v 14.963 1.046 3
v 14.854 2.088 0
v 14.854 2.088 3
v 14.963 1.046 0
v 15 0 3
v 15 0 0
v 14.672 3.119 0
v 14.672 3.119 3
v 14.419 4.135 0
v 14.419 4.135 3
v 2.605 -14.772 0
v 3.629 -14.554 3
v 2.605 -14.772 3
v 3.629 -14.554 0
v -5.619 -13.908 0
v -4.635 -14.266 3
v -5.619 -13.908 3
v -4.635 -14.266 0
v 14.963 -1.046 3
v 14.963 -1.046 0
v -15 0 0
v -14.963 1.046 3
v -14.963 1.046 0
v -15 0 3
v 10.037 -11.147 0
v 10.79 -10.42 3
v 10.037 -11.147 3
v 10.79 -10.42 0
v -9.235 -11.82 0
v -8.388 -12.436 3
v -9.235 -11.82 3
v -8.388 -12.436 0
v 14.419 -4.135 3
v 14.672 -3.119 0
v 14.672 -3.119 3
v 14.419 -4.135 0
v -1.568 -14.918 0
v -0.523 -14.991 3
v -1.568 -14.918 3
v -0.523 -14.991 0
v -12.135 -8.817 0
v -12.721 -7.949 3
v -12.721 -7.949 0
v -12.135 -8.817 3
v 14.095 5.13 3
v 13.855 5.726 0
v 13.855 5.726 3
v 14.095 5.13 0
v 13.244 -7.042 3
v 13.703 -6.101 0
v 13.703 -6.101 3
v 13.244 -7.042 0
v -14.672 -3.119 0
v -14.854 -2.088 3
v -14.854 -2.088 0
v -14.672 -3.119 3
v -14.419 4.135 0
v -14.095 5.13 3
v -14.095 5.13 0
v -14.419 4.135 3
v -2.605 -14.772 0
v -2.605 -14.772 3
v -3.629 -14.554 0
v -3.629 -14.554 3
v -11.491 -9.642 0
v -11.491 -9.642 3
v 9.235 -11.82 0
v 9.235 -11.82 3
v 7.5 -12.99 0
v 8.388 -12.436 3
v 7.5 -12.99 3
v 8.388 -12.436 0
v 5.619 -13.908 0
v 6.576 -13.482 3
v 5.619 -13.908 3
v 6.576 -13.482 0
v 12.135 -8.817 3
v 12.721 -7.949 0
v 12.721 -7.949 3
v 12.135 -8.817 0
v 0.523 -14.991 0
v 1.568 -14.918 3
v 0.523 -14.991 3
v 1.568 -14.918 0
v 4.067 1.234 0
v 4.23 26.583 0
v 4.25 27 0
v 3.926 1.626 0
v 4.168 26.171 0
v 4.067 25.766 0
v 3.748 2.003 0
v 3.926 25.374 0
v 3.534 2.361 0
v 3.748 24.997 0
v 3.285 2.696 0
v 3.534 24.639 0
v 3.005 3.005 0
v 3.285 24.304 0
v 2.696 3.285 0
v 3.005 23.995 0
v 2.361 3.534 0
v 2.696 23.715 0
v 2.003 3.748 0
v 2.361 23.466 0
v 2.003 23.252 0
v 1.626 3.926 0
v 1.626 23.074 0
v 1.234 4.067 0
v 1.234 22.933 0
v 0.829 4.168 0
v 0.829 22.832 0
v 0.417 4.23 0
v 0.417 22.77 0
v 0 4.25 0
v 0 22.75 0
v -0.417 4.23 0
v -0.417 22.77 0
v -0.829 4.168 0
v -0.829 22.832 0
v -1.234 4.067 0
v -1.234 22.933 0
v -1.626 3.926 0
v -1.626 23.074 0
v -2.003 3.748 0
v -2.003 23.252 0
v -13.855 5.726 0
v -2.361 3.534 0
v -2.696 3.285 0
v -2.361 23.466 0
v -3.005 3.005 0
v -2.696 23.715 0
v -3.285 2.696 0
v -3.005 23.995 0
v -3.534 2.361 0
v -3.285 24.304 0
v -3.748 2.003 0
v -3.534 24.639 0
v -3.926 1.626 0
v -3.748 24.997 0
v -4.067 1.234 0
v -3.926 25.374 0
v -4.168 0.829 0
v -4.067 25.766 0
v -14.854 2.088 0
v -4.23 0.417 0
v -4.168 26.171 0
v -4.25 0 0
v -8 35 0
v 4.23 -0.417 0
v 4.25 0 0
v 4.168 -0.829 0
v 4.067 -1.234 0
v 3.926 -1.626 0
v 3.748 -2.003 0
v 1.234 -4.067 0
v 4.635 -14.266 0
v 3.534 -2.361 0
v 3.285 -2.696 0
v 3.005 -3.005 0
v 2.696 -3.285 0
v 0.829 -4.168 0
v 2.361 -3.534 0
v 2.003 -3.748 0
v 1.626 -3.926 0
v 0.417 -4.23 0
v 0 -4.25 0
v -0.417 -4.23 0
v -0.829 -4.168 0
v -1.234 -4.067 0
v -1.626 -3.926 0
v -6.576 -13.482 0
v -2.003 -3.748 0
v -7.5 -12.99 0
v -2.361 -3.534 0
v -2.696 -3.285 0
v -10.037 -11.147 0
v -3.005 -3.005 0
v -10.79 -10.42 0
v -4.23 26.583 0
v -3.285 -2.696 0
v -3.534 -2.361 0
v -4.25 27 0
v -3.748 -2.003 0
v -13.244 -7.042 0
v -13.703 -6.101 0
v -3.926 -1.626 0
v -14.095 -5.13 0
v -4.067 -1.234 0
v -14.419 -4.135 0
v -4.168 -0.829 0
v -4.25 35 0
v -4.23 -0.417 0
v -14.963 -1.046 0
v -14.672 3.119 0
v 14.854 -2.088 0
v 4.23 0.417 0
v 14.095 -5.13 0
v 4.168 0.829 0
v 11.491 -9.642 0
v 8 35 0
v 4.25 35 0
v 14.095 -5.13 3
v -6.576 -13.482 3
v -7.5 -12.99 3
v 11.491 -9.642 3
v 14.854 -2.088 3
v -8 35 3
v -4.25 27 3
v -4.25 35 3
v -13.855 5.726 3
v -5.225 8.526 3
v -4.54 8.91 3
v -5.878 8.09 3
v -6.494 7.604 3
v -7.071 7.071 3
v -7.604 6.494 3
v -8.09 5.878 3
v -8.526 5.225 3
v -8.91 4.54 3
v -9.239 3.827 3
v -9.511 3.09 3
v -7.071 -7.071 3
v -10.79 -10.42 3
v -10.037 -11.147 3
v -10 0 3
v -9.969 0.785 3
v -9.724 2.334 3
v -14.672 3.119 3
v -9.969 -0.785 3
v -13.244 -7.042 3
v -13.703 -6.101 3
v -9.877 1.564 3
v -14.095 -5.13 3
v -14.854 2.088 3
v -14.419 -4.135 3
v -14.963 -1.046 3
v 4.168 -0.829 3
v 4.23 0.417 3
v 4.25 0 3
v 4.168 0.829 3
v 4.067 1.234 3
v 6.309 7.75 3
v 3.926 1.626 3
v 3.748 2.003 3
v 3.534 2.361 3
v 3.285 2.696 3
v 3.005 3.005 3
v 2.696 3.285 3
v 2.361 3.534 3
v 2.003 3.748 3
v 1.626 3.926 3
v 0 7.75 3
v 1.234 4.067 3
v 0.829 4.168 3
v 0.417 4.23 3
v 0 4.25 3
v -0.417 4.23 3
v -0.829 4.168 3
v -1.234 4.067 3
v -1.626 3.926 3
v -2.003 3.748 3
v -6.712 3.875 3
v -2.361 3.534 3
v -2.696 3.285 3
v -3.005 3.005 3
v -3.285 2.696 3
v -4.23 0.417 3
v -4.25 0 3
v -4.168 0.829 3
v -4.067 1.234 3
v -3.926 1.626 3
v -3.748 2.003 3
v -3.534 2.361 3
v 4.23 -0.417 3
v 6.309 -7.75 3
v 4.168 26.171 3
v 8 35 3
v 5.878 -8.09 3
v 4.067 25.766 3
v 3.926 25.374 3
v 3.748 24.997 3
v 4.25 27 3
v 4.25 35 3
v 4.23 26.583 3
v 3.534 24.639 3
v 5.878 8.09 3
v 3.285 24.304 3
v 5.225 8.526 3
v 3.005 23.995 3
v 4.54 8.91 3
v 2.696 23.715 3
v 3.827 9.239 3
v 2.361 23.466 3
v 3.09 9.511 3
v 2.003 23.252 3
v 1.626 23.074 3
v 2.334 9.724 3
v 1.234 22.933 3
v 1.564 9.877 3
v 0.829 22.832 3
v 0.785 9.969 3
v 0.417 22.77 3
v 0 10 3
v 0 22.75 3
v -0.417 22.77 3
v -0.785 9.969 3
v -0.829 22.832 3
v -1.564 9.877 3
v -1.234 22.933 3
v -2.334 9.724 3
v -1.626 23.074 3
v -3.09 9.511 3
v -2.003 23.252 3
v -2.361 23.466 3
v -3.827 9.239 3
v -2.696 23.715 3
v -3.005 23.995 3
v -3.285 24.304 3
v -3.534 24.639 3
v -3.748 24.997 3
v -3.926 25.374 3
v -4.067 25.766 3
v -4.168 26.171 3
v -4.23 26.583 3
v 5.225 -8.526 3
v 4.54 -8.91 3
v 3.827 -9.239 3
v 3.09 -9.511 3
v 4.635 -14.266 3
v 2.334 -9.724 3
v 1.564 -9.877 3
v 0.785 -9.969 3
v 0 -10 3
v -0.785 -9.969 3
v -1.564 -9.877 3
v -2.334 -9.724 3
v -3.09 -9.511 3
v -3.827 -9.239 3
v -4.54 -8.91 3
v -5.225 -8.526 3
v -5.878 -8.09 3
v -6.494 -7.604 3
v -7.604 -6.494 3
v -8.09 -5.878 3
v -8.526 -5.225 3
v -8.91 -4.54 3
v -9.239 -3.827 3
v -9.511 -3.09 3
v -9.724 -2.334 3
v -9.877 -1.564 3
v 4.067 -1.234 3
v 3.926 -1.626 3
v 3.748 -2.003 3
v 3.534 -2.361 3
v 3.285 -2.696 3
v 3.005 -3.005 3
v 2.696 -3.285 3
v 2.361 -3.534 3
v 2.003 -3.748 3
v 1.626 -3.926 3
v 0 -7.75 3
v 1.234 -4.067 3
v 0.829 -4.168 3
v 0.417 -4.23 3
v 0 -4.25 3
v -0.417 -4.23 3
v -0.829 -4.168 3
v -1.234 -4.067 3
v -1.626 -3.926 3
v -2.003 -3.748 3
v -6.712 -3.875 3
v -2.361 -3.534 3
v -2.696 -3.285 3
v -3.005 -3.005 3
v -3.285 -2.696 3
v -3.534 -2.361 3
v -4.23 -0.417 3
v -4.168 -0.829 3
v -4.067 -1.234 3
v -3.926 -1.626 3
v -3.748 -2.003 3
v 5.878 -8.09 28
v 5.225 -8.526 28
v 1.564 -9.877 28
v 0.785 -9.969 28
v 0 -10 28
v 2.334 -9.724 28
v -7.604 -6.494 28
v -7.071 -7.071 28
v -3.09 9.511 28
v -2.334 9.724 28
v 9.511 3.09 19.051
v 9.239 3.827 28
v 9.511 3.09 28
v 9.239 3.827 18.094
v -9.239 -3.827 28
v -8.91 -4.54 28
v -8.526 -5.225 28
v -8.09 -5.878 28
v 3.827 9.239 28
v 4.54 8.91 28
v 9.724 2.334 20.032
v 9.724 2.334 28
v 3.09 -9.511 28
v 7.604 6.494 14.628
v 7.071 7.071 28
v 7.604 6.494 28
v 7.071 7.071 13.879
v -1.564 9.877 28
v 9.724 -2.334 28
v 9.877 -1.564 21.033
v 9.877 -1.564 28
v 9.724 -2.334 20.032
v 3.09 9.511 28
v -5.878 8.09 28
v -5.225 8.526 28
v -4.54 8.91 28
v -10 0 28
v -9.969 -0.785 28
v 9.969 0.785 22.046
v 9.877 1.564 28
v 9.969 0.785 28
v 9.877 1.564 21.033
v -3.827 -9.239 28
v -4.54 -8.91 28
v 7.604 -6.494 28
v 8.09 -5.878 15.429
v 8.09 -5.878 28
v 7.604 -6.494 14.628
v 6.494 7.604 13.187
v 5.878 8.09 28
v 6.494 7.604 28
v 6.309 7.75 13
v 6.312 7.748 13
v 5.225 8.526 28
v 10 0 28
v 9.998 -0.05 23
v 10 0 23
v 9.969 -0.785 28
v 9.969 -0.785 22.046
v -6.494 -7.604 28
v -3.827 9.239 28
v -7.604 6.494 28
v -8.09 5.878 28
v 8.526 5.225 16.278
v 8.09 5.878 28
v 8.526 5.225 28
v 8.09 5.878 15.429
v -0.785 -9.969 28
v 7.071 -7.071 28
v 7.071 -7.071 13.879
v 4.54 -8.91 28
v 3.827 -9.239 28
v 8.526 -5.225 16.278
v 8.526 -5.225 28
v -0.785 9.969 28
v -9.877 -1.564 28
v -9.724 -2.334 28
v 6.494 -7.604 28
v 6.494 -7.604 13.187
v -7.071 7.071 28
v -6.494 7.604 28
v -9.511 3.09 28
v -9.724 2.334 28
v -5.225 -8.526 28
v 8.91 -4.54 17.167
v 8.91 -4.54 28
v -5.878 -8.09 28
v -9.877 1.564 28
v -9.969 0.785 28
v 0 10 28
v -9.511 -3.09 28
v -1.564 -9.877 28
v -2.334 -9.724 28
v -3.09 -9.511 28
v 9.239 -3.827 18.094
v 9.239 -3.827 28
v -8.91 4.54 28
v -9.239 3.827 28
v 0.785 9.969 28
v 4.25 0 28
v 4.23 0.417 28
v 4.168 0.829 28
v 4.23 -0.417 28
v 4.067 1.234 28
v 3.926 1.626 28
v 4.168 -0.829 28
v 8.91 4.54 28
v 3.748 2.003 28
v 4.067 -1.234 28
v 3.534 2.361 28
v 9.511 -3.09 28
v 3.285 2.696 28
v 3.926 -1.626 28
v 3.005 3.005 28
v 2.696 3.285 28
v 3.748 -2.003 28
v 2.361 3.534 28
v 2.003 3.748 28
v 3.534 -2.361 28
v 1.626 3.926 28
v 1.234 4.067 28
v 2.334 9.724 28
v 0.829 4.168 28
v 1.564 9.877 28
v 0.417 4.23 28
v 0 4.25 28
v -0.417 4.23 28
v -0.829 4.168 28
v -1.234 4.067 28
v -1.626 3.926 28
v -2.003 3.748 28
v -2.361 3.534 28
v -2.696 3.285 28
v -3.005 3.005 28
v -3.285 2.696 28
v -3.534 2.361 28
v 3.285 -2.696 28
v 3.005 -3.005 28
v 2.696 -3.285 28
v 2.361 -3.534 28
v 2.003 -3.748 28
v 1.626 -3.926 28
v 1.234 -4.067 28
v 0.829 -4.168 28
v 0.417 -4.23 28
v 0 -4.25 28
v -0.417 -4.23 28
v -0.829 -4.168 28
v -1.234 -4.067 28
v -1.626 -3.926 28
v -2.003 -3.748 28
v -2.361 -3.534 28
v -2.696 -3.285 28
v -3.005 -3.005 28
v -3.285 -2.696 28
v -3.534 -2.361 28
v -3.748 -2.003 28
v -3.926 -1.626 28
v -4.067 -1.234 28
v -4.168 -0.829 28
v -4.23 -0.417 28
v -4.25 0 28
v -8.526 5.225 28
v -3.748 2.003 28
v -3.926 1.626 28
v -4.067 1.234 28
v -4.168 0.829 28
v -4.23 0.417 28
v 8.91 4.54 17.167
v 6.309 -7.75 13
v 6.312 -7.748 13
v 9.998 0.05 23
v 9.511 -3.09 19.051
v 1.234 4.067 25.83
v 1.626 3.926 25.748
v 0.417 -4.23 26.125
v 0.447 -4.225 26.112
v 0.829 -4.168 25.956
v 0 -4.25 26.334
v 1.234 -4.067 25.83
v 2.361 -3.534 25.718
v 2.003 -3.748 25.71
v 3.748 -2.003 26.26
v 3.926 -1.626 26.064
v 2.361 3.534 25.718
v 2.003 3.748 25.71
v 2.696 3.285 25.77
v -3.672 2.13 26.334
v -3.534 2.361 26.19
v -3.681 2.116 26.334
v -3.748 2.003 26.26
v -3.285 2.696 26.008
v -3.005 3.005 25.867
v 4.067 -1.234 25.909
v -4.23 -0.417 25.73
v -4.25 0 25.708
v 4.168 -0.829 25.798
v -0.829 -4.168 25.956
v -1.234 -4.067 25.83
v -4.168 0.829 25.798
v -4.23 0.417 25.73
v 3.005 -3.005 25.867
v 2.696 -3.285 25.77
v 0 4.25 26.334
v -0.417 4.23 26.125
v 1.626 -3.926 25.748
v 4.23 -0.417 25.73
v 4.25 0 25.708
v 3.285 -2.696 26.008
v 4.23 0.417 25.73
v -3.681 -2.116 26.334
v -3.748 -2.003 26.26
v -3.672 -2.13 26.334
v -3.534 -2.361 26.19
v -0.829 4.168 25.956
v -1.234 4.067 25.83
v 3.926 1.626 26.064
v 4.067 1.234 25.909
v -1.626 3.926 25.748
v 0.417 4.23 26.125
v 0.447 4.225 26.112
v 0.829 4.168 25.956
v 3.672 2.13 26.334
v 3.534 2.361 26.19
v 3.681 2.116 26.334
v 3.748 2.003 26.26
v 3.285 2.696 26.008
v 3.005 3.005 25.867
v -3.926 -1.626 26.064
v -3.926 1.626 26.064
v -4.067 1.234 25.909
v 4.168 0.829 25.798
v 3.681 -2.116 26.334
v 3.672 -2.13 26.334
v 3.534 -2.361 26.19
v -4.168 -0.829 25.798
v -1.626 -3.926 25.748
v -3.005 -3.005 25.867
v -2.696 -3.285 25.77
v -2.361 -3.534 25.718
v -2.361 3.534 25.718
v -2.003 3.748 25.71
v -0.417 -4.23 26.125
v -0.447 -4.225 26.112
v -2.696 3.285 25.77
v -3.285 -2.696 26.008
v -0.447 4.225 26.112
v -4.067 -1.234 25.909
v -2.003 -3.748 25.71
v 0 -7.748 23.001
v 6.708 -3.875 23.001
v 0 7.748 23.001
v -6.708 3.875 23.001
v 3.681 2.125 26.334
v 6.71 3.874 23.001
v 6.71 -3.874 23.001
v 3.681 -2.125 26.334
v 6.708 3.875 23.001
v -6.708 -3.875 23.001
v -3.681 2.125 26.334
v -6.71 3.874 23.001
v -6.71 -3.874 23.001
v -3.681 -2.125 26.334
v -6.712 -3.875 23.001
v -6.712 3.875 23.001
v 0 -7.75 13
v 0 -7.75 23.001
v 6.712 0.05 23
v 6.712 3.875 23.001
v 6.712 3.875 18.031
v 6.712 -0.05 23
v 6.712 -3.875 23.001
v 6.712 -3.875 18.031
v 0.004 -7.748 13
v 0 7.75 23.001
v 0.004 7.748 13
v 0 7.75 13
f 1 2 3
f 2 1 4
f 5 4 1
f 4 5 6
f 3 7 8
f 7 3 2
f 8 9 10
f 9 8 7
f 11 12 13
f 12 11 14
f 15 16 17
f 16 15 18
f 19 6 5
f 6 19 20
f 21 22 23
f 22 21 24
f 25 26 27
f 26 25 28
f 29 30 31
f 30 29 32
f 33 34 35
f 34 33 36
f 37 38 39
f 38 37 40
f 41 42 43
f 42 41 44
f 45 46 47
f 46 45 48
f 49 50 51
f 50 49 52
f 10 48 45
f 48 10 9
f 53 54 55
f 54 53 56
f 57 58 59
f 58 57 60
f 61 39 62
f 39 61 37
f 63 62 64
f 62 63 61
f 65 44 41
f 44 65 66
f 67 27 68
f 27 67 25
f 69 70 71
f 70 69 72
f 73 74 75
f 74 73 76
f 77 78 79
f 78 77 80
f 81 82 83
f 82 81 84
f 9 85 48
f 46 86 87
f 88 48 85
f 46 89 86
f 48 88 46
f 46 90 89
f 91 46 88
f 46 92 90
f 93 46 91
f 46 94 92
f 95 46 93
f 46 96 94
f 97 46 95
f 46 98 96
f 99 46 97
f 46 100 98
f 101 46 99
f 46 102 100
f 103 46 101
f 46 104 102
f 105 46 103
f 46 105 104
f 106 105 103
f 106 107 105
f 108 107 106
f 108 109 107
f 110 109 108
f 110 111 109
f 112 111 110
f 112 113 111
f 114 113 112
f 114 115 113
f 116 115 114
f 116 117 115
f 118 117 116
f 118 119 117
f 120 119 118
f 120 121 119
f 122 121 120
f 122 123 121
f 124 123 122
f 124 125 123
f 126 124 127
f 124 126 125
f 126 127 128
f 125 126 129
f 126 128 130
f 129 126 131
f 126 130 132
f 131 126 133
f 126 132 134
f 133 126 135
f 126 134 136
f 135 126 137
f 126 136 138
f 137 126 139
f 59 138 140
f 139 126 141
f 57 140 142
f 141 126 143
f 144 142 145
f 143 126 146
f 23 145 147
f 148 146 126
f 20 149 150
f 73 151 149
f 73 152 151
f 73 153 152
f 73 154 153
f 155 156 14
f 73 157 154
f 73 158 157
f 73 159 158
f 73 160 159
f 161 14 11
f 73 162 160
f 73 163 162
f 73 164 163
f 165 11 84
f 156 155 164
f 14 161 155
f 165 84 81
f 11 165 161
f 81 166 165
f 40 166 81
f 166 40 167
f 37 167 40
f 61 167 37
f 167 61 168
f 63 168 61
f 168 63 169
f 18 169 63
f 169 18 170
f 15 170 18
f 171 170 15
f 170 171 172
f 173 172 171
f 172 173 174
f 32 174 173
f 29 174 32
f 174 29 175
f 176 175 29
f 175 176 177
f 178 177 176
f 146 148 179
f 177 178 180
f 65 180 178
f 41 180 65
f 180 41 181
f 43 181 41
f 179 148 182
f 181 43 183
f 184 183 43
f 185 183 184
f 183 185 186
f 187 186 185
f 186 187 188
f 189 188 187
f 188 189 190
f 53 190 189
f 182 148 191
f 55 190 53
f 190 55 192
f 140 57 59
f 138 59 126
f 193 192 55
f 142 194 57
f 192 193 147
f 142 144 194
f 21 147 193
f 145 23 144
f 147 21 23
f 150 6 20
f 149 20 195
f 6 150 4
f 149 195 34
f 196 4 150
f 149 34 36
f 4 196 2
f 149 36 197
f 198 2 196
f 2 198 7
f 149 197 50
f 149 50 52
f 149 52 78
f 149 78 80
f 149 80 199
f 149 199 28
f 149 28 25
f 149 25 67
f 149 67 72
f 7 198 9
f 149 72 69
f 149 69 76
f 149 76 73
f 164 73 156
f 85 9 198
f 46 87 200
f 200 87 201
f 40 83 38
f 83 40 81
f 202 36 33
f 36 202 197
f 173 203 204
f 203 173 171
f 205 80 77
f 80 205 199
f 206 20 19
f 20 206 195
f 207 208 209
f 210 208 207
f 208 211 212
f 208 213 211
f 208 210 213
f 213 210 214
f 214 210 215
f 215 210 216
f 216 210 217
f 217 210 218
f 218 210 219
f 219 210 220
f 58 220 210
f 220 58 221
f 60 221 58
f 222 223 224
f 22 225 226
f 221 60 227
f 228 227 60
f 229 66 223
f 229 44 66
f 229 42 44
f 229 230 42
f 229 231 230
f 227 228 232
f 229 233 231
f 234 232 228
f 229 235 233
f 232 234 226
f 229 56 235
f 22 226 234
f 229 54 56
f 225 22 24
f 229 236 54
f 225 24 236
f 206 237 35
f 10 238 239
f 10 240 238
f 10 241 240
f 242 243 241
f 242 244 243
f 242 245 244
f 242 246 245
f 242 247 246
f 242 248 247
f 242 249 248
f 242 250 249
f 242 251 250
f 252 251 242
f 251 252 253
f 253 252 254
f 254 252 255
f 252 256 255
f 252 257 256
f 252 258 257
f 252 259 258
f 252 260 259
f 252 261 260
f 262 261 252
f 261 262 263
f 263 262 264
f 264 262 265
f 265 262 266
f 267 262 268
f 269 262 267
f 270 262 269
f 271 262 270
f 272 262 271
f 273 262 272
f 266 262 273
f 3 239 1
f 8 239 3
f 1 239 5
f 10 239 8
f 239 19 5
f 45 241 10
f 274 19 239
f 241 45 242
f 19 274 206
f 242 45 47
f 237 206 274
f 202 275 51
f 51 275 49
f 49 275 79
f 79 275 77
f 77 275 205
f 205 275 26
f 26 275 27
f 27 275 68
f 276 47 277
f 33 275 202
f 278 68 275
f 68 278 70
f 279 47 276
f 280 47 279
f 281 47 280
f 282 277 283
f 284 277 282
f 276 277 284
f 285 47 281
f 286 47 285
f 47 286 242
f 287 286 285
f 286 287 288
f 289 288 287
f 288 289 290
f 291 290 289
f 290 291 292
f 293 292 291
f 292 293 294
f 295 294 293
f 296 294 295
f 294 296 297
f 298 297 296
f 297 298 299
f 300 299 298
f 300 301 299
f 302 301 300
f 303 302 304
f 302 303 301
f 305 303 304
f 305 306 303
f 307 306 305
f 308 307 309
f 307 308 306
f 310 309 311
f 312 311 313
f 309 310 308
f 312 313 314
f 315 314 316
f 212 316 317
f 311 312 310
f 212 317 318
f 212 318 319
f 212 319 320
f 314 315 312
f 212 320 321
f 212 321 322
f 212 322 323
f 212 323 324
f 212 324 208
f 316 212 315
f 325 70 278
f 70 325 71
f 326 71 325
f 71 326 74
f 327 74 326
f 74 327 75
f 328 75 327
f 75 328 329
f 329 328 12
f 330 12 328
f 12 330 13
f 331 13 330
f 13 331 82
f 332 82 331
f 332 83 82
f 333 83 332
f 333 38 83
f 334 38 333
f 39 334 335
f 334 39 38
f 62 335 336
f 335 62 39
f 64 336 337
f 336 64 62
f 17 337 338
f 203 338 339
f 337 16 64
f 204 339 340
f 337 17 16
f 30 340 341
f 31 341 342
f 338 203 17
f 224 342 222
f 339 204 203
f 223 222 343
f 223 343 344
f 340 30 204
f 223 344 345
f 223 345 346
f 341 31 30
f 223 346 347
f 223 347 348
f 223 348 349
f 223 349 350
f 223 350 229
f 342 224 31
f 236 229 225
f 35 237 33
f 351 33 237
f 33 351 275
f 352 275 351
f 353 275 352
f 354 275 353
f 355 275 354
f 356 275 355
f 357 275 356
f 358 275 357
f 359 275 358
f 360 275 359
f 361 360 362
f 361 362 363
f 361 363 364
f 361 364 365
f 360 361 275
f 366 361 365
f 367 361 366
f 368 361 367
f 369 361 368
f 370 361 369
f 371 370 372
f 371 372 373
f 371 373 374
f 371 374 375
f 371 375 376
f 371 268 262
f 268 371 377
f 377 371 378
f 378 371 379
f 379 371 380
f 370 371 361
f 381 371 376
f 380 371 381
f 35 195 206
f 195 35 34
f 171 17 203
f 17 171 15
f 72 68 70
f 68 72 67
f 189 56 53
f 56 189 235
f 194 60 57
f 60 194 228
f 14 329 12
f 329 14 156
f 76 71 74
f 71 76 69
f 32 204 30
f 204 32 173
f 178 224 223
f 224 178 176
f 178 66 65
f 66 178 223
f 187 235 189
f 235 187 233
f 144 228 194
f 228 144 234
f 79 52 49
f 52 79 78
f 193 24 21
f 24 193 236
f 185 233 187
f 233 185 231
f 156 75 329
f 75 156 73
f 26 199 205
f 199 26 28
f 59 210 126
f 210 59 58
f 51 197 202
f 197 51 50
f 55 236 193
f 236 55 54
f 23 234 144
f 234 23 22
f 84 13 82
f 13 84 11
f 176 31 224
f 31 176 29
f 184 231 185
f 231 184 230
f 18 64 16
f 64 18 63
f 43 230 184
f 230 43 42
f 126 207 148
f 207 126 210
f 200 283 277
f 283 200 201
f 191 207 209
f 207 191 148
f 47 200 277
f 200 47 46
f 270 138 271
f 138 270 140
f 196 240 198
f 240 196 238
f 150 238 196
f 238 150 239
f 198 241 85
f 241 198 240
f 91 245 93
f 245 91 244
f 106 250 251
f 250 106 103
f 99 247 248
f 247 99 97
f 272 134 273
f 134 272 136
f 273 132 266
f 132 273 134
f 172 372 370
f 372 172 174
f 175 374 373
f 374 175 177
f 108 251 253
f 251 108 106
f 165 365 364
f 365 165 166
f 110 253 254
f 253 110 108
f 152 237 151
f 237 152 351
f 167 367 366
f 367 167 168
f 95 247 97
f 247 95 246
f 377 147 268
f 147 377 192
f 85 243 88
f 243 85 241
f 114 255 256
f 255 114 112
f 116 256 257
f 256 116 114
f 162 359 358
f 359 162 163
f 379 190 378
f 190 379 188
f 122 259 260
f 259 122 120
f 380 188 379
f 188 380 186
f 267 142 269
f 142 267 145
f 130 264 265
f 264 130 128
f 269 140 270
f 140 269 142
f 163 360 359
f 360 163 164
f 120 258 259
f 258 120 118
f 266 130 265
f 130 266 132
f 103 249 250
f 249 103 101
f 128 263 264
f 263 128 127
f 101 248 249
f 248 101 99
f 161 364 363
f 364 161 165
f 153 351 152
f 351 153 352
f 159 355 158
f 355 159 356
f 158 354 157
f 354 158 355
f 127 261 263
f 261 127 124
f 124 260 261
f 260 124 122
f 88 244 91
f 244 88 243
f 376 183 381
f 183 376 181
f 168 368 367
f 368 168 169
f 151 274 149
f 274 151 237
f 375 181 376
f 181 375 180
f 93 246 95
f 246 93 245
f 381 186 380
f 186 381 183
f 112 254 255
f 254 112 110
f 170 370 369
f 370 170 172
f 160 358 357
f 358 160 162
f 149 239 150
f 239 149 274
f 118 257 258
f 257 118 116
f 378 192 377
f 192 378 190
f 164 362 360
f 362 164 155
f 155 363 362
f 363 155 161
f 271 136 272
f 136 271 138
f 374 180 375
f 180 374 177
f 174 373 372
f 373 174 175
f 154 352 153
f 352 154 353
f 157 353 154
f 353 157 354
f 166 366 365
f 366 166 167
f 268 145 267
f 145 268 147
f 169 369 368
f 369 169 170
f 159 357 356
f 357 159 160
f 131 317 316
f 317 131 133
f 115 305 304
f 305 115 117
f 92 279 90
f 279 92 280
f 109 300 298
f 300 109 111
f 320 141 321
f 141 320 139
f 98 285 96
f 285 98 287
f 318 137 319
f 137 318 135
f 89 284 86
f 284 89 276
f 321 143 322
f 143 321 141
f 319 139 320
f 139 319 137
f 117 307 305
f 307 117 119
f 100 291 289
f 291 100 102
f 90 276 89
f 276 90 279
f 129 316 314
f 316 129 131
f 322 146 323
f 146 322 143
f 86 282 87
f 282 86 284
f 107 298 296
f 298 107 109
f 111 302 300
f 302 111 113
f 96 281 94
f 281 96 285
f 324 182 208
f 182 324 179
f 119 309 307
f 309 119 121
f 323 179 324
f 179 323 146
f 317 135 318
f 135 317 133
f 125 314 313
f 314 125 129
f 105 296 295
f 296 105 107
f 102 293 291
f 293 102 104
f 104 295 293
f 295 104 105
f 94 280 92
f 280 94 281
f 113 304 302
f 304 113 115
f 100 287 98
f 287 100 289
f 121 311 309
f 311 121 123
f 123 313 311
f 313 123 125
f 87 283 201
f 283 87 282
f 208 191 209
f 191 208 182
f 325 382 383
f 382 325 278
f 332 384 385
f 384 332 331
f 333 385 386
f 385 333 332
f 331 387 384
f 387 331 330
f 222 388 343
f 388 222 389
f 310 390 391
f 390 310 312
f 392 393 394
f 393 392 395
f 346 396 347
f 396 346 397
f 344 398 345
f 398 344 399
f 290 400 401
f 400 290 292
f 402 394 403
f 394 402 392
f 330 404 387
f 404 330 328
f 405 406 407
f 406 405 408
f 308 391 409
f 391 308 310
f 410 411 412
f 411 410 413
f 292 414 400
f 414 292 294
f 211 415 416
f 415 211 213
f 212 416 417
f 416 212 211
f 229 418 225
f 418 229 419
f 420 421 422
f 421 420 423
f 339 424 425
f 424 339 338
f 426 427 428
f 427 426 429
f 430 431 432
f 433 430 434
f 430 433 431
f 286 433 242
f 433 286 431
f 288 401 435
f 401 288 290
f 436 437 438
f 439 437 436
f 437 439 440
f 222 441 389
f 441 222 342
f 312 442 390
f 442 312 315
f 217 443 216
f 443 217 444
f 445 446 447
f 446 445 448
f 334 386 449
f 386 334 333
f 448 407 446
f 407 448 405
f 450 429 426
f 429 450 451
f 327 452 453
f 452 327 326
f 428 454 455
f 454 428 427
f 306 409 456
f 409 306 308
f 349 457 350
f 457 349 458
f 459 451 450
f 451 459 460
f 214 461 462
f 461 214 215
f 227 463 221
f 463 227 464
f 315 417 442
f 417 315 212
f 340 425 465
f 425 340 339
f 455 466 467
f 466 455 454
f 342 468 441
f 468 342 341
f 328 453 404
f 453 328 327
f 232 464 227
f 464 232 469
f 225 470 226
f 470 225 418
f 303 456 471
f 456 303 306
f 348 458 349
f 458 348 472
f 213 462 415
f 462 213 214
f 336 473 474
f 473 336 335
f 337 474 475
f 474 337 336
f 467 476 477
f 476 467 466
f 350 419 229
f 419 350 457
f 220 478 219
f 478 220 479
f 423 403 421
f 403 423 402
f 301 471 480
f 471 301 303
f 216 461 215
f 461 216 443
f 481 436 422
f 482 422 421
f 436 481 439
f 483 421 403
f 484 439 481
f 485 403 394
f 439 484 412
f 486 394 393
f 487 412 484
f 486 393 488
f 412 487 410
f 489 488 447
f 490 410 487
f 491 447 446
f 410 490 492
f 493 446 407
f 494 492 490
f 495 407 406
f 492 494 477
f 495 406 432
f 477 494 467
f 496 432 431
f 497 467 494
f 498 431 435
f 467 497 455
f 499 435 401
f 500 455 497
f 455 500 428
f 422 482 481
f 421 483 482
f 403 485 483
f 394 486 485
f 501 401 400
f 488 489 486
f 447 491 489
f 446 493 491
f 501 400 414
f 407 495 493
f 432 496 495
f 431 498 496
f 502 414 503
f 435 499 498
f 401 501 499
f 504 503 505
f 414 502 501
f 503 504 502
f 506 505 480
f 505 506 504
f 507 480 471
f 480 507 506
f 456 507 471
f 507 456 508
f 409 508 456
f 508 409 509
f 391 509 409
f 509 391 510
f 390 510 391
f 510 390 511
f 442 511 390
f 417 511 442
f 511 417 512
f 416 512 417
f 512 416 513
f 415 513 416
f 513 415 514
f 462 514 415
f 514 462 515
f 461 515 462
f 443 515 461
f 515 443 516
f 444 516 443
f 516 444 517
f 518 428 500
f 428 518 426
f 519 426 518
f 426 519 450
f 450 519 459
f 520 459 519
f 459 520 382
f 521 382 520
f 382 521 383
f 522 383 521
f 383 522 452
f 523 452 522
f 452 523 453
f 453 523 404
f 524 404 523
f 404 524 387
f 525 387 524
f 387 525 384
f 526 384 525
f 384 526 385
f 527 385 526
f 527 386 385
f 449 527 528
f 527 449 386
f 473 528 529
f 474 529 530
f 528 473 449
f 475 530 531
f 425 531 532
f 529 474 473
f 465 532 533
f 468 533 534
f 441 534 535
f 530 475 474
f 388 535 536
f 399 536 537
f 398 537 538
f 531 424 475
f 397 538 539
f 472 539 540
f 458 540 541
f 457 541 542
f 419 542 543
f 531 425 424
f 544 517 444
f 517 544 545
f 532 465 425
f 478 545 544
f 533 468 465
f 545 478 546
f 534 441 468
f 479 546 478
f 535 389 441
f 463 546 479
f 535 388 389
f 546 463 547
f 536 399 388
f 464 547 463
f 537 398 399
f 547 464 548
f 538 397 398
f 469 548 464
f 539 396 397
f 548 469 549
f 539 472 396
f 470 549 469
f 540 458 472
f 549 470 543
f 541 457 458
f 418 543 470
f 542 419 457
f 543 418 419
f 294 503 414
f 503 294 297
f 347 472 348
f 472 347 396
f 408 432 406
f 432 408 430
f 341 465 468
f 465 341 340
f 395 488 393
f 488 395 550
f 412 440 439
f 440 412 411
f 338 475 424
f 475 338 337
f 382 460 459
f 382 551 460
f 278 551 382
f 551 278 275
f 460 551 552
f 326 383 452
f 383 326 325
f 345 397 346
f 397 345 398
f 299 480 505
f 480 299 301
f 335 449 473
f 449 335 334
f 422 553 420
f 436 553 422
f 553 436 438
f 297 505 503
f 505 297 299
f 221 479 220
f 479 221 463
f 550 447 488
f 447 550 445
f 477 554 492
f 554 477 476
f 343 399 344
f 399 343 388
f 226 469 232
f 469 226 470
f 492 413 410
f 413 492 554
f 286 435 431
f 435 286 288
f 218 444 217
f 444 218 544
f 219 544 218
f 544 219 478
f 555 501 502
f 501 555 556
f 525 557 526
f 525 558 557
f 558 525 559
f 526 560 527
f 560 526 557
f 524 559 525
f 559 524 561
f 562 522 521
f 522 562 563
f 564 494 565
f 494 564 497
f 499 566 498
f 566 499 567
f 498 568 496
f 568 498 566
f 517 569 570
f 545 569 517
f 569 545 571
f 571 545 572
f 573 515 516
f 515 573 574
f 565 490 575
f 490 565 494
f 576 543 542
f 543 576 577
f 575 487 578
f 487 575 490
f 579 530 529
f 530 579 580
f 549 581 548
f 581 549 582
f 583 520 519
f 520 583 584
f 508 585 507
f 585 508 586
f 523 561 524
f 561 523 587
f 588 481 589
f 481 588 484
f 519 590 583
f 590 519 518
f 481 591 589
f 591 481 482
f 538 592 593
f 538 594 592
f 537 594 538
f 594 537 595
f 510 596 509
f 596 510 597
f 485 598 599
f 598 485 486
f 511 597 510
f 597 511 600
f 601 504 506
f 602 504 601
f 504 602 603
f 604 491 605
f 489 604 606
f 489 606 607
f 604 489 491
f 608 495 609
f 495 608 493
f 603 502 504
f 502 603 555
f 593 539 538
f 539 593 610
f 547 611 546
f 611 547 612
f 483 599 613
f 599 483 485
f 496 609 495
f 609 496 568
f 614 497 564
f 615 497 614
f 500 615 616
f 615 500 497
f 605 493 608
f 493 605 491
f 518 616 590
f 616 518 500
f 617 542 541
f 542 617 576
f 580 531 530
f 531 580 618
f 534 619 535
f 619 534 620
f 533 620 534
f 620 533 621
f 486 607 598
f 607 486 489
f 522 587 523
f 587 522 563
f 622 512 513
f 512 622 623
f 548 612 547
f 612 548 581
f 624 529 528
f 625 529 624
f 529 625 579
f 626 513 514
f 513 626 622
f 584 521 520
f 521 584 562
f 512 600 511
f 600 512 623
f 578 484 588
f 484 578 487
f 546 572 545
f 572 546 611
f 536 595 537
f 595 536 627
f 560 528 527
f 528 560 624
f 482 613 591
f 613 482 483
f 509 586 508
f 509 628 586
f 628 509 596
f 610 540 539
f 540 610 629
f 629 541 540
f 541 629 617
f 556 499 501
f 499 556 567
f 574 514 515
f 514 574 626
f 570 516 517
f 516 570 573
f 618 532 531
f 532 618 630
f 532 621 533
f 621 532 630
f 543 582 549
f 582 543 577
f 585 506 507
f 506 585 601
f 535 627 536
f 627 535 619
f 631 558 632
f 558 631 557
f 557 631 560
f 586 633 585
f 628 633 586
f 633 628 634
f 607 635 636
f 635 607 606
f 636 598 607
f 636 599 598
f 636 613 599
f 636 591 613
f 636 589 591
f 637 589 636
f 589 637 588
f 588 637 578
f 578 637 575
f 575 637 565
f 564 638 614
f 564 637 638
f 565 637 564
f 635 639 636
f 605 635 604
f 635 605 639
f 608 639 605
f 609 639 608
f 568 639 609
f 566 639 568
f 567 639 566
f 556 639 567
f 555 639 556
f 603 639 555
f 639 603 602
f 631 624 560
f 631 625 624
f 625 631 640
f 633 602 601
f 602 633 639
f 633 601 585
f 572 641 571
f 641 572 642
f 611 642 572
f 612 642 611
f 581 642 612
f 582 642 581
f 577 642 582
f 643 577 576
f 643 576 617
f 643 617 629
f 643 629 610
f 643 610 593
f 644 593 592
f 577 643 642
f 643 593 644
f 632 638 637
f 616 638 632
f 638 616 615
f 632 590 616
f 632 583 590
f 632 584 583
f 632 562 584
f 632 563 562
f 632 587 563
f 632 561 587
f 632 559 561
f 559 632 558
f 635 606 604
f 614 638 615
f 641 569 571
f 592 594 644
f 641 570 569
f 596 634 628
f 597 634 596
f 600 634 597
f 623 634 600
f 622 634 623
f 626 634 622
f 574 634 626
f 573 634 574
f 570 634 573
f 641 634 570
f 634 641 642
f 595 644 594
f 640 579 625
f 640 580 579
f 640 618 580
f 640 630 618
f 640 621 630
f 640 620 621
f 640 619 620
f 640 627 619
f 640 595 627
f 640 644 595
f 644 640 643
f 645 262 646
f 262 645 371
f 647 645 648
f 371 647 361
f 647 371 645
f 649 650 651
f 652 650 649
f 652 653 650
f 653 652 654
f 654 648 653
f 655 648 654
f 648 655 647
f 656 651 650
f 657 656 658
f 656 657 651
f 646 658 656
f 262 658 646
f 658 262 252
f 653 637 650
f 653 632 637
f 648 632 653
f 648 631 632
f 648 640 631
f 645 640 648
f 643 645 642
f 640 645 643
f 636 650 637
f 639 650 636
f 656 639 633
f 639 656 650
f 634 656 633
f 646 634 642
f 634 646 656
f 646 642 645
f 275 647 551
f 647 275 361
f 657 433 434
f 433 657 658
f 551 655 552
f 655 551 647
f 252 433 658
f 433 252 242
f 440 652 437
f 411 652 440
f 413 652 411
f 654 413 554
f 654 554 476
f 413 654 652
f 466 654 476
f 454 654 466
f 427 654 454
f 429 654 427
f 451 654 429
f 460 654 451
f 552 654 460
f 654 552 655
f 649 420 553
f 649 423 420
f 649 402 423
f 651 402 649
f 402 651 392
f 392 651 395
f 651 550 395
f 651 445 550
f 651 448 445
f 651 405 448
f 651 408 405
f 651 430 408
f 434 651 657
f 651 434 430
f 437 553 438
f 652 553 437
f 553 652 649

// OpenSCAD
/* [General] */
// Tolerance for inner diameters
tolerance = 0.5;

/* [Threaded rod] */
// Rod diameter
rodDiameter = 8.0;
// Nut diameter
rodNutDiameter = 15.0;

/* [Guide/smooth rod] */
// Rod diameter
guideDiameter = 8.0;
// Distance to the threaded rod
guideDistance = 27.0;

/* [Base part] */
// Diameter
baseOuterDiameter = 30.0;
// Width of the tip
baseTipWidth = 16.0;
// Length of the tip
baseTipLength = 35.0;
// Height
baseHeight = 3.0;

/* [Container part] */
// Outer diamter of the cylinder
tensionerOuterDiameter = 20.0;
// Overall height
tensionerHeight = 25.0;
// Roof height
tensionerRoofHeight = 5.0;

mainPart();

module mainPart() {
    union() {
        basePart(baseOuterDiameter, baseHeight, baseTipWidth, baseTipLength, rodDiameter + tolerance, guideDiameter + tolerance, guideDistance);
        
        translate([0,0,baseHeight - 0.001])
        rotate([0, 0, -90])
            tensionPart(tensionerOuterDiameter, tensionerHeight + 0.001, tensionerRoofHeight, rodDiameter + tolerance, rodNutDiameter + tolerance);
    }
}

module basePart(baseOuterDiameter = baseOuterDiameter, baseHeight = baseHeight, baseTipWidth = baseTipWidth, baseTipLength = baseTipLength, rodDiameter = rodDiameter, guideDiameter = guideDiameter, guideDistance = guideDistance) {
    
    rodRadius = rodDiameter / 2;
    baseOuterRadius = baseOuterDiameter / 2;
    guideRadius = guideDiameter / 2;
    
    difference() {
        // Create base shape
        union() {
            cylinder(h = baseHeight, r1 = baseOuterRadius, r2 = baseOuterRadius, $fn = 90);
            
            translate([0,baseTipLength/2,0])
            trapezoid(w1 = baseOuterDiameter, w2 = baseTipWidth, h = baseHeight, d = baseTipLength);
        }
        
        // Cut out hole for rod
        translate([0,0,-0.5])
            cylinder(h = baseHeight + 1, r1 = rodRadius, r2 = rodRadius, $fn = 64);
        
        // Cut out hole for guide
        translate([0,guideDistance,-0.001])
            cylinder(h = baseHeight + 0.002, r1 = guideRadius, r2 = guideRadius, $fn = 64);
        translate([0,guideDistance + baseTipLength / 2,-0.001])
            box(guideDiameter, baseTipLength, baseHeight + 0.002);
    }
}

module tensionPart(tensionerOuterDiameter = tensionerOuterDiameter, tensionerHeight = tensionerHeight, tensionerRoofHeight = tensionerRoofHeight, rodDiameter = rodDiameter, rodNutDiameter = rodNutDiameter) {
    
    rodRadius = rodDiameter / 2;
    nutInlayHeight = tensionerHeight - tensionerRoofHeight;
    nutRadius = rodNutDiameter / 2;
    tensionerOuterRadius = tensionerOuterDiameter / 2;
    
    difference() {            
        cylinder(h = tensionerHeight, r1 = tensionerOuterDiameter / 2, r2 = tensionerOuterDiameter / 2, $fn = 80);
        
        // Cut out hole for rod
        translate([0,0,nutInlayHeight-0.001])
            cylinder(h = tensionerRoofHeight + 0.002, r1 = rodRadius, r2 = rodRadius, $fn = 64);
        translate([0,0,nutInlayHeight-0.001])
            cylinder(h = tensionerRoofHeight / 3 * 2 + 0.002, r1 = nutRadius, r2 = rodRadius, $fn = 6);
        
        // Cut out hole for the nut
        translate([0, 0, -0.001])
            cylinder(h=nutInlayHeight + 0.002, r1=nutRadius, r2=nutRadius, $fn = 6);
        translate([0, tensionerOuterRadius, -0.001])
            box(rodNutDiameter, tensionerOuterDiameter, nutInlayHeight / 2 + 0.002);
            
        rotate([90, 0, 0])
        translate([0, nutInlayHeight * 0.75 - 0.001, -tensionerOuterRadius])
            trapezoid(w1 = rodNutDiameter, w2 = 0.1, h = tensionerOuterRadius, d = nutInlayHeight / 2 + 0.002);
    }
}

/* 2d shapes */

module triangle(radius)
{
  o=radius/2; //equivalent to radius*sin(30)
  a=radius*sqrt(3)/2; //equivalent to radius*cos(30)
  polygon(points=[[-a,-o],[0,radius],[a,-o]],paths=[[0,1,2]]);
}

module rectangle(width, depth)
{
    polygon(points=[[-width/2,-depth/2],[width/2,-depth/2],[width/2,depth/2],[-width/2,depth/2]],paths=[[0,1,2,3]]);
}

/*
 * 3d shapes
 */

module box(width, depth, height)
{
    linear_extrude(height=height) 
        rectangle(width, depth);
}

module trapezoid(w1, w2, h, d) {
    linear_extrude(height=h) 
        polygon(points=[[-w1/2,-d/2],[w1/2,-d/2],[w2/2,d/2],[-w2/2,d/2]],paths=[[0,1,2,3]]);
}
